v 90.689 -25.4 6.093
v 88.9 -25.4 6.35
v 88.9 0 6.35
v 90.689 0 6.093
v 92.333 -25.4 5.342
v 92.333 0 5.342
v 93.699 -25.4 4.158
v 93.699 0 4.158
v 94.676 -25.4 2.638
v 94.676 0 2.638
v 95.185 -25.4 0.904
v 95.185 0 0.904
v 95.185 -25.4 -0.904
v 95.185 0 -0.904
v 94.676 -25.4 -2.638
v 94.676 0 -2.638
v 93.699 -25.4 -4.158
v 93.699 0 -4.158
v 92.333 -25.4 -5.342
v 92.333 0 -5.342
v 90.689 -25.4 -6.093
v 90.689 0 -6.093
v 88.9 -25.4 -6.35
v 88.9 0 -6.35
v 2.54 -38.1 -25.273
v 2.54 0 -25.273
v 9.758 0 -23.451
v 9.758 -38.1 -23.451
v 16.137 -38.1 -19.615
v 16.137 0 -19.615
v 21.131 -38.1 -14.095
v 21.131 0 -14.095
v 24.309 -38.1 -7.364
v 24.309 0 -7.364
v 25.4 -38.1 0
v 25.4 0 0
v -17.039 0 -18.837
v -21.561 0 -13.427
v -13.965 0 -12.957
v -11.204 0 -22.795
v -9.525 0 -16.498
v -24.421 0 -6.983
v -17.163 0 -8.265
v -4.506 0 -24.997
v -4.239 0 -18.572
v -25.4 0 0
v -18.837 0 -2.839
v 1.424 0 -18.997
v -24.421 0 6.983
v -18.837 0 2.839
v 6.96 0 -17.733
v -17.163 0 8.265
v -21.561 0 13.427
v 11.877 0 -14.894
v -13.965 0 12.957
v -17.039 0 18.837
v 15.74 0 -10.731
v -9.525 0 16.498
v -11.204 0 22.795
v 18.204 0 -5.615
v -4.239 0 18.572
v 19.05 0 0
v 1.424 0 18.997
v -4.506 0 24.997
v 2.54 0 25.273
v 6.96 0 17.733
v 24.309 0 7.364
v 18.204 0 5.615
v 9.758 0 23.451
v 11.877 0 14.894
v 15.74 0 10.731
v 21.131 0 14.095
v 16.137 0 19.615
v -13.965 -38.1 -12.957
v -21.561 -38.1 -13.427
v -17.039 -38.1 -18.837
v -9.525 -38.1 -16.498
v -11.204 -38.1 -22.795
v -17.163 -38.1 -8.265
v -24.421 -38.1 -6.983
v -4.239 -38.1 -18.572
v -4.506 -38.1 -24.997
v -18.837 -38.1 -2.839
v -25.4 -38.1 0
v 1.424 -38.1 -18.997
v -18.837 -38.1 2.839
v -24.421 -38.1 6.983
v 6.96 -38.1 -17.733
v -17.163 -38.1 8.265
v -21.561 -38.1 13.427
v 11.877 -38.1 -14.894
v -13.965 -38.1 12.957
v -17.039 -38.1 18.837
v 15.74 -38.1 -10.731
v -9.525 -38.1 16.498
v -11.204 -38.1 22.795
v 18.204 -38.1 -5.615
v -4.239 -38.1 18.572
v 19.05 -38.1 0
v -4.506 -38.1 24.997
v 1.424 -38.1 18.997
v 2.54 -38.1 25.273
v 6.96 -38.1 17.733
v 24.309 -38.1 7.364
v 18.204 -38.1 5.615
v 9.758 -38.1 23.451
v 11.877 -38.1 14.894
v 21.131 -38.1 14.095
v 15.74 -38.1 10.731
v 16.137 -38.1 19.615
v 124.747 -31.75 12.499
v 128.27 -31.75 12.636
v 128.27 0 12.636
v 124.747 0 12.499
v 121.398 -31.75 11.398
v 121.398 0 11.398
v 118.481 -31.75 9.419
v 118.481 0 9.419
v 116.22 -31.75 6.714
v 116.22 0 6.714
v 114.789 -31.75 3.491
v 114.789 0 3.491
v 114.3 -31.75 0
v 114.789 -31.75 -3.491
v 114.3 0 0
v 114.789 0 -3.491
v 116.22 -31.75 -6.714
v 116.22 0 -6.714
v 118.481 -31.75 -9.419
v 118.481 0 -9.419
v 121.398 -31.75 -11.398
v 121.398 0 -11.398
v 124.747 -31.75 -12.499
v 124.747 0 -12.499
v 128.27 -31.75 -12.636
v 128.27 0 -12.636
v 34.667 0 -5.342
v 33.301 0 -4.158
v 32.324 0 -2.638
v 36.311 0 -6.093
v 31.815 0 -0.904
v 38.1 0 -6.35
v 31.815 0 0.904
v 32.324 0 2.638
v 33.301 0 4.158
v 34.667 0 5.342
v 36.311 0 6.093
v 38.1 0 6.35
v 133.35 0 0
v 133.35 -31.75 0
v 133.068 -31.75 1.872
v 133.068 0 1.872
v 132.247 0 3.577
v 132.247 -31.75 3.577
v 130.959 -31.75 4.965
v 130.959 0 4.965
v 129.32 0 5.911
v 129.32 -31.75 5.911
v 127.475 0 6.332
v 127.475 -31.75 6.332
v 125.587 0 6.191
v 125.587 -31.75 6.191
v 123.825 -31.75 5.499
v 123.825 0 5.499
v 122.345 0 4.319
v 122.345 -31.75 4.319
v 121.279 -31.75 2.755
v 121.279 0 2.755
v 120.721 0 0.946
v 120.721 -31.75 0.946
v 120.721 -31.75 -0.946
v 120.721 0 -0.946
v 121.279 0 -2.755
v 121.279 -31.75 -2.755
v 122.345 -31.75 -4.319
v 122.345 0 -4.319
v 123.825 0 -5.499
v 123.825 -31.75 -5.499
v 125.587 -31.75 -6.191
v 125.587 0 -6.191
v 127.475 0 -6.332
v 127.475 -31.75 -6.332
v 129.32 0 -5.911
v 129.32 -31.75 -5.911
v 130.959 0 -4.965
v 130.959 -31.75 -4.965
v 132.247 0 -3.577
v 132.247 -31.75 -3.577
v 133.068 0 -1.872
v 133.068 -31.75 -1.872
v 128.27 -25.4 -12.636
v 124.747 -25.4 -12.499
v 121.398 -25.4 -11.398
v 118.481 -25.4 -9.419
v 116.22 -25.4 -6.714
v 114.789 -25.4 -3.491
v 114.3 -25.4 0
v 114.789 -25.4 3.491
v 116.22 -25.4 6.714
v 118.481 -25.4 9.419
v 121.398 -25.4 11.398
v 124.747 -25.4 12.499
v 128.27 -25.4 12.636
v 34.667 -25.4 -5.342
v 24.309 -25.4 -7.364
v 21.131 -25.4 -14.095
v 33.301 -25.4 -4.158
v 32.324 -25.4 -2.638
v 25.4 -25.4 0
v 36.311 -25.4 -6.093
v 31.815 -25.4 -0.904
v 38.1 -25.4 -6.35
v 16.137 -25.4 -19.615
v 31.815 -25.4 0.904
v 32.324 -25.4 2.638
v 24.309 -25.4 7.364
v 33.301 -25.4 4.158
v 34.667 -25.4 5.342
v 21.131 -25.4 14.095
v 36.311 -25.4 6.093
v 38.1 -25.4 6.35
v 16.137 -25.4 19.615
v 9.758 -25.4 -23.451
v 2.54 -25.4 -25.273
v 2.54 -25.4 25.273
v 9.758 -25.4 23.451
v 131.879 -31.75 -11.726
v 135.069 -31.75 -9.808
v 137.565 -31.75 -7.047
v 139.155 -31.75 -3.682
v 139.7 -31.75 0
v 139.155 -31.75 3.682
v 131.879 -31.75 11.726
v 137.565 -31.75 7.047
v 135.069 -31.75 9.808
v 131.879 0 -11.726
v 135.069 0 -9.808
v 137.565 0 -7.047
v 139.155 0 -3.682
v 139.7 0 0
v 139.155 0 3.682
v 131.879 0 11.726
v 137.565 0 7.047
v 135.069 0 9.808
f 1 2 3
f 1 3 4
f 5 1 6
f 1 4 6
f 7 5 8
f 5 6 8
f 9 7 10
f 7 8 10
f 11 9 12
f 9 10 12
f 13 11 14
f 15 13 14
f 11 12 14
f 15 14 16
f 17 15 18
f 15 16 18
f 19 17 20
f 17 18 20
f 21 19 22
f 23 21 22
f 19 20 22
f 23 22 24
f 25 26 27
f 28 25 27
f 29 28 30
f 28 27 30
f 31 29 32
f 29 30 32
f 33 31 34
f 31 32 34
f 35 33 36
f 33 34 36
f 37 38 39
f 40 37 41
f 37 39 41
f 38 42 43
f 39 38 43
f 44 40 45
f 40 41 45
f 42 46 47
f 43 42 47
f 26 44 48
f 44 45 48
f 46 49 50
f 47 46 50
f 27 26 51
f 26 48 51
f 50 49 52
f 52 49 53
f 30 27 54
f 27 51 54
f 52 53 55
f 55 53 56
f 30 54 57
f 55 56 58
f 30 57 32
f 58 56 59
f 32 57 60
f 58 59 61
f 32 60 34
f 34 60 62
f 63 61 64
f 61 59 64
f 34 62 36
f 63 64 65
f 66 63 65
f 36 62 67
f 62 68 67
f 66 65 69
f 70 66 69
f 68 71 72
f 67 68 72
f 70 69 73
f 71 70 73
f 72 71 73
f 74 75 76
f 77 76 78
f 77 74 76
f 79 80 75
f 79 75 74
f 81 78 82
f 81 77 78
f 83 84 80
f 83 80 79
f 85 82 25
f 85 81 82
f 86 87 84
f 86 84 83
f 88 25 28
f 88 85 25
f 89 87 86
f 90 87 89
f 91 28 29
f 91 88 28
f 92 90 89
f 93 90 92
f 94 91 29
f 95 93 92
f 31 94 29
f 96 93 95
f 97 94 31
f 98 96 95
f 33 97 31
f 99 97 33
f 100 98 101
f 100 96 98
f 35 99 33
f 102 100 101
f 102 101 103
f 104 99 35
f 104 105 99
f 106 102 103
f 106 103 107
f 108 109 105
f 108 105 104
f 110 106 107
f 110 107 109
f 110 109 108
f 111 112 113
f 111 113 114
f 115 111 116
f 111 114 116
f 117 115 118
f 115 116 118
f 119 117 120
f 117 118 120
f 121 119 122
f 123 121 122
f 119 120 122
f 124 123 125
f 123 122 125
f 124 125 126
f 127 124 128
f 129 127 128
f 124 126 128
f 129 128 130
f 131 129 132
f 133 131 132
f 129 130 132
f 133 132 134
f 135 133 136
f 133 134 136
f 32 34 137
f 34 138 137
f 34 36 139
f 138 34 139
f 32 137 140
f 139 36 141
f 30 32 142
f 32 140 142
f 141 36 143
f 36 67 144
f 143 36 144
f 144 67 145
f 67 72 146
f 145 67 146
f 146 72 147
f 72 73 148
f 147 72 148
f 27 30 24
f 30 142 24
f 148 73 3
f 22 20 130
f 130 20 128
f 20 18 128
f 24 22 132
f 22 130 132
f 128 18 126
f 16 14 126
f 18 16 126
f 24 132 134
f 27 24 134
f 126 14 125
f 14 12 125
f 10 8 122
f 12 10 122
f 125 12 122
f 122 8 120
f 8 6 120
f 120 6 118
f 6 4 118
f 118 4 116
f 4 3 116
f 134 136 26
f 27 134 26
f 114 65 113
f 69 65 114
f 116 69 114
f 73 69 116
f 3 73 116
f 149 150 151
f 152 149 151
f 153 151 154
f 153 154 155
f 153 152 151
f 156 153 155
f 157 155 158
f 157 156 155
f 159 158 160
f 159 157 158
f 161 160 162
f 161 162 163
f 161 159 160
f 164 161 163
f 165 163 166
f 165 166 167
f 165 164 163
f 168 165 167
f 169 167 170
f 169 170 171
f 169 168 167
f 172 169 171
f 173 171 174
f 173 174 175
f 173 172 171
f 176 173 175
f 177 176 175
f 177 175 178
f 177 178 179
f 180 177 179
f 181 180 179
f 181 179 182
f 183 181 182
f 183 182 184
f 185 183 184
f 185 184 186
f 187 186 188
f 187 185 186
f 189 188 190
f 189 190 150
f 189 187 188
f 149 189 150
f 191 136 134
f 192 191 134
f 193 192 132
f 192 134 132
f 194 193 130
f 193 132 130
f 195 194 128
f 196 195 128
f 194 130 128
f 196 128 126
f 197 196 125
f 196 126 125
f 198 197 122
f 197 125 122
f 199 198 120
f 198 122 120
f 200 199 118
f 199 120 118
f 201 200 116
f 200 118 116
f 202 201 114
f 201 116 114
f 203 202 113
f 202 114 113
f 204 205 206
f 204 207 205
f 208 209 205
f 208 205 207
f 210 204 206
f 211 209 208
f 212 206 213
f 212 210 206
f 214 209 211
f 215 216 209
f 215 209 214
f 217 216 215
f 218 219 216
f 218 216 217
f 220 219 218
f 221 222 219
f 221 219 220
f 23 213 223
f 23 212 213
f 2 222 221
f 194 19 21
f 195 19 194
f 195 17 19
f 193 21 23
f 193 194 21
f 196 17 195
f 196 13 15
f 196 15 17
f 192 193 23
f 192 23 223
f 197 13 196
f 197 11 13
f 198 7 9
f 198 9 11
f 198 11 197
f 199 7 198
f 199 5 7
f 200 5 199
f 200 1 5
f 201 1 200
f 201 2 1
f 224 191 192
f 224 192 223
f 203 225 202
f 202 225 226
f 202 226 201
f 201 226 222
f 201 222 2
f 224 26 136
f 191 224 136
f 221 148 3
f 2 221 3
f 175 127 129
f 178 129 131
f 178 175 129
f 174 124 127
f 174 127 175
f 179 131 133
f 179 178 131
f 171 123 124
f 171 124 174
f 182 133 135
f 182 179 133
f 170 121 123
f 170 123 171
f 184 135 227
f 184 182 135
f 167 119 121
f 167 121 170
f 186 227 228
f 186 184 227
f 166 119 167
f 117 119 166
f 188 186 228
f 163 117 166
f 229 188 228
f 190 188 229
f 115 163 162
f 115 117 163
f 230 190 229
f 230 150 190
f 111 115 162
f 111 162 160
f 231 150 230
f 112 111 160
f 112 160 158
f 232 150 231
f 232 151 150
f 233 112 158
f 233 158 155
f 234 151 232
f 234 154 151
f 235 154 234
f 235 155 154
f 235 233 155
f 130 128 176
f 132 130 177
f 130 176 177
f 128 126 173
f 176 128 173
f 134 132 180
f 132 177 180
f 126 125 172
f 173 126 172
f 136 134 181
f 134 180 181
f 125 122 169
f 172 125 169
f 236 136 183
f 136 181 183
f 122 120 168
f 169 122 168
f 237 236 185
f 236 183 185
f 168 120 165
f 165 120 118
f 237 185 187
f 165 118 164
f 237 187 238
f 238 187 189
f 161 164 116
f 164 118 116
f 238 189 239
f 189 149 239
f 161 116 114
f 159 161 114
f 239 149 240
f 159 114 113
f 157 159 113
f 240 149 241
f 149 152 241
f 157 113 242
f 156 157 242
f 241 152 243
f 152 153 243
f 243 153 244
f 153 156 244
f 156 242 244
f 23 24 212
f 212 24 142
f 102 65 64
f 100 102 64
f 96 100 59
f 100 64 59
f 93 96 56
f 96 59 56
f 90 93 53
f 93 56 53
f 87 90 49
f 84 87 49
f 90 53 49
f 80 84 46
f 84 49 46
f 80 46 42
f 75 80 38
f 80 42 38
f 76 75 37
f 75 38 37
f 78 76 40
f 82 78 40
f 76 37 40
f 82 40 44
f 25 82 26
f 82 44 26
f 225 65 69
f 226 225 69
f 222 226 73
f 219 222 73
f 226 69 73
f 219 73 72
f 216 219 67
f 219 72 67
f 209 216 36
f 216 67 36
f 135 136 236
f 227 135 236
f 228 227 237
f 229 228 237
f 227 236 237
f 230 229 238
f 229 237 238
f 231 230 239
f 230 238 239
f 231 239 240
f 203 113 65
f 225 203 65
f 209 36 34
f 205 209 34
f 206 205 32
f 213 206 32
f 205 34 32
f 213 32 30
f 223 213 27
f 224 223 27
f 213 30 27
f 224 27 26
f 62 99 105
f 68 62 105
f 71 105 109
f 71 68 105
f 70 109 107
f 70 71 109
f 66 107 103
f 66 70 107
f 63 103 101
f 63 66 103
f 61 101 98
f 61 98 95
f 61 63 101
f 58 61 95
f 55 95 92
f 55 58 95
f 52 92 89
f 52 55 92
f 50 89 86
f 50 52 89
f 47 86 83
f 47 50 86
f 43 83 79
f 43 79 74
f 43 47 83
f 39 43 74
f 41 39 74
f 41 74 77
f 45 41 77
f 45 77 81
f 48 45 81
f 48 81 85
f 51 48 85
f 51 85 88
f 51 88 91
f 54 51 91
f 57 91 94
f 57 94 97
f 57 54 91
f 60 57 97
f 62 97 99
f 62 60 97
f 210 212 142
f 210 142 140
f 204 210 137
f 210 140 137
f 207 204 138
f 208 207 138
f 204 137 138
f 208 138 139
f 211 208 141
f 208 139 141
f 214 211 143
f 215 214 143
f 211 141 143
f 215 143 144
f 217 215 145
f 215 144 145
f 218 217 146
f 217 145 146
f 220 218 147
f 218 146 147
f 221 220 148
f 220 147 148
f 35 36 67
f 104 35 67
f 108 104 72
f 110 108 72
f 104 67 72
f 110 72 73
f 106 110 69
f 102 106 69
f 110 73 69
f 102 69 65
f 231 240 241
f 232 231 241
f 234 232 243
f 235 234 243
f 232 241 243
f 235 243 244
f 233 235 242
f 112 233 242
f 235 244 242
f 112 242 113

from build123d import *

# Parameters (mm, degrees)
F0_R     = 19.05
F1_DEPTH = 38.1
F2_DEPTH = 25.4
F0_R_2   = 6.35
F3_DEPTH = 31.75


with BuildPart() as f1:
    # F0 (on Front) → F1 (new body)
    with BuildSketch(Plane.XZ):
        with BuildLine():
            ThreePointArc((2.54, -25.272681), (18.837144, -17.038838), (25.4, 0))
            ThreePointArc((25.4, 0), (18.837144, 17.038838), (2.54, 25.272681))
            ThreePointArc((2.54, 25.272681), (-25.4, 0), (2.54, -25.272681))
        make_face()
        Circle(F0_R, mode=Mode.SUBTRACT)
    extrude(amount=F1_DEPTH)


with BuildPart() as f2:
    # F0 (on Front) → F2 (new body)
    with BuildSketch(Plane.XZ):
        with BuildLine():
            ThreePointArc((2.54, 25.272681), (18.837144, 17.038838), (25.4, 0))
            ThreePointArc((25.4, 0), (18.837144, -17.038838), (2.54, -25.272681))
            Line((2.54, -25.272681), (128.27, -12.63634))
            ThreePointArc((128.27, -12.63634), (114.3, 0), (128.27, 12.63634))
            Line((128.27, 12.63634), (2.54, 25.272681))
        make_face()
        with BuildLine():
            ThreePointArc((88.9, 6.35), (95.25, 0), (88.9, -6.35))
            Line((88.9, -6.35), (38.1, -6.35))
            ThreePointArc((38.1, -6.35), (31.75, 0), (38.1, 6.35))
            Line((38.1, 6.35), (88.9, 6.35))
        make_face(mode=Mode.SUBTRACT)
    extrude(amount=F2_DEPTH)


with BuildPart() as f3:
    # F0 (on Front) → F3 (new body)
    with BuildSketch(Plane.XZ):
        with BuildLine():
            ThreePointArc((139.7, 0), (136.418572, 8.519419), (128.27, 12.63634))
            ThreePointArc((128.27, 12.63634), (114.3, 0), (128.27, -12.63634))
            ThreePointArc((128.27, -12.63634), (136.418572, -8.519419), (139.7, 0))
        make_face()
        with Locations((127, 0)):
            Circle(F0_R_2, mode=Mode.SUBTRACT)
    extrude(amount=F3_DEPTH)


solid = Compound([f1.part, f2.part, f3.part])
